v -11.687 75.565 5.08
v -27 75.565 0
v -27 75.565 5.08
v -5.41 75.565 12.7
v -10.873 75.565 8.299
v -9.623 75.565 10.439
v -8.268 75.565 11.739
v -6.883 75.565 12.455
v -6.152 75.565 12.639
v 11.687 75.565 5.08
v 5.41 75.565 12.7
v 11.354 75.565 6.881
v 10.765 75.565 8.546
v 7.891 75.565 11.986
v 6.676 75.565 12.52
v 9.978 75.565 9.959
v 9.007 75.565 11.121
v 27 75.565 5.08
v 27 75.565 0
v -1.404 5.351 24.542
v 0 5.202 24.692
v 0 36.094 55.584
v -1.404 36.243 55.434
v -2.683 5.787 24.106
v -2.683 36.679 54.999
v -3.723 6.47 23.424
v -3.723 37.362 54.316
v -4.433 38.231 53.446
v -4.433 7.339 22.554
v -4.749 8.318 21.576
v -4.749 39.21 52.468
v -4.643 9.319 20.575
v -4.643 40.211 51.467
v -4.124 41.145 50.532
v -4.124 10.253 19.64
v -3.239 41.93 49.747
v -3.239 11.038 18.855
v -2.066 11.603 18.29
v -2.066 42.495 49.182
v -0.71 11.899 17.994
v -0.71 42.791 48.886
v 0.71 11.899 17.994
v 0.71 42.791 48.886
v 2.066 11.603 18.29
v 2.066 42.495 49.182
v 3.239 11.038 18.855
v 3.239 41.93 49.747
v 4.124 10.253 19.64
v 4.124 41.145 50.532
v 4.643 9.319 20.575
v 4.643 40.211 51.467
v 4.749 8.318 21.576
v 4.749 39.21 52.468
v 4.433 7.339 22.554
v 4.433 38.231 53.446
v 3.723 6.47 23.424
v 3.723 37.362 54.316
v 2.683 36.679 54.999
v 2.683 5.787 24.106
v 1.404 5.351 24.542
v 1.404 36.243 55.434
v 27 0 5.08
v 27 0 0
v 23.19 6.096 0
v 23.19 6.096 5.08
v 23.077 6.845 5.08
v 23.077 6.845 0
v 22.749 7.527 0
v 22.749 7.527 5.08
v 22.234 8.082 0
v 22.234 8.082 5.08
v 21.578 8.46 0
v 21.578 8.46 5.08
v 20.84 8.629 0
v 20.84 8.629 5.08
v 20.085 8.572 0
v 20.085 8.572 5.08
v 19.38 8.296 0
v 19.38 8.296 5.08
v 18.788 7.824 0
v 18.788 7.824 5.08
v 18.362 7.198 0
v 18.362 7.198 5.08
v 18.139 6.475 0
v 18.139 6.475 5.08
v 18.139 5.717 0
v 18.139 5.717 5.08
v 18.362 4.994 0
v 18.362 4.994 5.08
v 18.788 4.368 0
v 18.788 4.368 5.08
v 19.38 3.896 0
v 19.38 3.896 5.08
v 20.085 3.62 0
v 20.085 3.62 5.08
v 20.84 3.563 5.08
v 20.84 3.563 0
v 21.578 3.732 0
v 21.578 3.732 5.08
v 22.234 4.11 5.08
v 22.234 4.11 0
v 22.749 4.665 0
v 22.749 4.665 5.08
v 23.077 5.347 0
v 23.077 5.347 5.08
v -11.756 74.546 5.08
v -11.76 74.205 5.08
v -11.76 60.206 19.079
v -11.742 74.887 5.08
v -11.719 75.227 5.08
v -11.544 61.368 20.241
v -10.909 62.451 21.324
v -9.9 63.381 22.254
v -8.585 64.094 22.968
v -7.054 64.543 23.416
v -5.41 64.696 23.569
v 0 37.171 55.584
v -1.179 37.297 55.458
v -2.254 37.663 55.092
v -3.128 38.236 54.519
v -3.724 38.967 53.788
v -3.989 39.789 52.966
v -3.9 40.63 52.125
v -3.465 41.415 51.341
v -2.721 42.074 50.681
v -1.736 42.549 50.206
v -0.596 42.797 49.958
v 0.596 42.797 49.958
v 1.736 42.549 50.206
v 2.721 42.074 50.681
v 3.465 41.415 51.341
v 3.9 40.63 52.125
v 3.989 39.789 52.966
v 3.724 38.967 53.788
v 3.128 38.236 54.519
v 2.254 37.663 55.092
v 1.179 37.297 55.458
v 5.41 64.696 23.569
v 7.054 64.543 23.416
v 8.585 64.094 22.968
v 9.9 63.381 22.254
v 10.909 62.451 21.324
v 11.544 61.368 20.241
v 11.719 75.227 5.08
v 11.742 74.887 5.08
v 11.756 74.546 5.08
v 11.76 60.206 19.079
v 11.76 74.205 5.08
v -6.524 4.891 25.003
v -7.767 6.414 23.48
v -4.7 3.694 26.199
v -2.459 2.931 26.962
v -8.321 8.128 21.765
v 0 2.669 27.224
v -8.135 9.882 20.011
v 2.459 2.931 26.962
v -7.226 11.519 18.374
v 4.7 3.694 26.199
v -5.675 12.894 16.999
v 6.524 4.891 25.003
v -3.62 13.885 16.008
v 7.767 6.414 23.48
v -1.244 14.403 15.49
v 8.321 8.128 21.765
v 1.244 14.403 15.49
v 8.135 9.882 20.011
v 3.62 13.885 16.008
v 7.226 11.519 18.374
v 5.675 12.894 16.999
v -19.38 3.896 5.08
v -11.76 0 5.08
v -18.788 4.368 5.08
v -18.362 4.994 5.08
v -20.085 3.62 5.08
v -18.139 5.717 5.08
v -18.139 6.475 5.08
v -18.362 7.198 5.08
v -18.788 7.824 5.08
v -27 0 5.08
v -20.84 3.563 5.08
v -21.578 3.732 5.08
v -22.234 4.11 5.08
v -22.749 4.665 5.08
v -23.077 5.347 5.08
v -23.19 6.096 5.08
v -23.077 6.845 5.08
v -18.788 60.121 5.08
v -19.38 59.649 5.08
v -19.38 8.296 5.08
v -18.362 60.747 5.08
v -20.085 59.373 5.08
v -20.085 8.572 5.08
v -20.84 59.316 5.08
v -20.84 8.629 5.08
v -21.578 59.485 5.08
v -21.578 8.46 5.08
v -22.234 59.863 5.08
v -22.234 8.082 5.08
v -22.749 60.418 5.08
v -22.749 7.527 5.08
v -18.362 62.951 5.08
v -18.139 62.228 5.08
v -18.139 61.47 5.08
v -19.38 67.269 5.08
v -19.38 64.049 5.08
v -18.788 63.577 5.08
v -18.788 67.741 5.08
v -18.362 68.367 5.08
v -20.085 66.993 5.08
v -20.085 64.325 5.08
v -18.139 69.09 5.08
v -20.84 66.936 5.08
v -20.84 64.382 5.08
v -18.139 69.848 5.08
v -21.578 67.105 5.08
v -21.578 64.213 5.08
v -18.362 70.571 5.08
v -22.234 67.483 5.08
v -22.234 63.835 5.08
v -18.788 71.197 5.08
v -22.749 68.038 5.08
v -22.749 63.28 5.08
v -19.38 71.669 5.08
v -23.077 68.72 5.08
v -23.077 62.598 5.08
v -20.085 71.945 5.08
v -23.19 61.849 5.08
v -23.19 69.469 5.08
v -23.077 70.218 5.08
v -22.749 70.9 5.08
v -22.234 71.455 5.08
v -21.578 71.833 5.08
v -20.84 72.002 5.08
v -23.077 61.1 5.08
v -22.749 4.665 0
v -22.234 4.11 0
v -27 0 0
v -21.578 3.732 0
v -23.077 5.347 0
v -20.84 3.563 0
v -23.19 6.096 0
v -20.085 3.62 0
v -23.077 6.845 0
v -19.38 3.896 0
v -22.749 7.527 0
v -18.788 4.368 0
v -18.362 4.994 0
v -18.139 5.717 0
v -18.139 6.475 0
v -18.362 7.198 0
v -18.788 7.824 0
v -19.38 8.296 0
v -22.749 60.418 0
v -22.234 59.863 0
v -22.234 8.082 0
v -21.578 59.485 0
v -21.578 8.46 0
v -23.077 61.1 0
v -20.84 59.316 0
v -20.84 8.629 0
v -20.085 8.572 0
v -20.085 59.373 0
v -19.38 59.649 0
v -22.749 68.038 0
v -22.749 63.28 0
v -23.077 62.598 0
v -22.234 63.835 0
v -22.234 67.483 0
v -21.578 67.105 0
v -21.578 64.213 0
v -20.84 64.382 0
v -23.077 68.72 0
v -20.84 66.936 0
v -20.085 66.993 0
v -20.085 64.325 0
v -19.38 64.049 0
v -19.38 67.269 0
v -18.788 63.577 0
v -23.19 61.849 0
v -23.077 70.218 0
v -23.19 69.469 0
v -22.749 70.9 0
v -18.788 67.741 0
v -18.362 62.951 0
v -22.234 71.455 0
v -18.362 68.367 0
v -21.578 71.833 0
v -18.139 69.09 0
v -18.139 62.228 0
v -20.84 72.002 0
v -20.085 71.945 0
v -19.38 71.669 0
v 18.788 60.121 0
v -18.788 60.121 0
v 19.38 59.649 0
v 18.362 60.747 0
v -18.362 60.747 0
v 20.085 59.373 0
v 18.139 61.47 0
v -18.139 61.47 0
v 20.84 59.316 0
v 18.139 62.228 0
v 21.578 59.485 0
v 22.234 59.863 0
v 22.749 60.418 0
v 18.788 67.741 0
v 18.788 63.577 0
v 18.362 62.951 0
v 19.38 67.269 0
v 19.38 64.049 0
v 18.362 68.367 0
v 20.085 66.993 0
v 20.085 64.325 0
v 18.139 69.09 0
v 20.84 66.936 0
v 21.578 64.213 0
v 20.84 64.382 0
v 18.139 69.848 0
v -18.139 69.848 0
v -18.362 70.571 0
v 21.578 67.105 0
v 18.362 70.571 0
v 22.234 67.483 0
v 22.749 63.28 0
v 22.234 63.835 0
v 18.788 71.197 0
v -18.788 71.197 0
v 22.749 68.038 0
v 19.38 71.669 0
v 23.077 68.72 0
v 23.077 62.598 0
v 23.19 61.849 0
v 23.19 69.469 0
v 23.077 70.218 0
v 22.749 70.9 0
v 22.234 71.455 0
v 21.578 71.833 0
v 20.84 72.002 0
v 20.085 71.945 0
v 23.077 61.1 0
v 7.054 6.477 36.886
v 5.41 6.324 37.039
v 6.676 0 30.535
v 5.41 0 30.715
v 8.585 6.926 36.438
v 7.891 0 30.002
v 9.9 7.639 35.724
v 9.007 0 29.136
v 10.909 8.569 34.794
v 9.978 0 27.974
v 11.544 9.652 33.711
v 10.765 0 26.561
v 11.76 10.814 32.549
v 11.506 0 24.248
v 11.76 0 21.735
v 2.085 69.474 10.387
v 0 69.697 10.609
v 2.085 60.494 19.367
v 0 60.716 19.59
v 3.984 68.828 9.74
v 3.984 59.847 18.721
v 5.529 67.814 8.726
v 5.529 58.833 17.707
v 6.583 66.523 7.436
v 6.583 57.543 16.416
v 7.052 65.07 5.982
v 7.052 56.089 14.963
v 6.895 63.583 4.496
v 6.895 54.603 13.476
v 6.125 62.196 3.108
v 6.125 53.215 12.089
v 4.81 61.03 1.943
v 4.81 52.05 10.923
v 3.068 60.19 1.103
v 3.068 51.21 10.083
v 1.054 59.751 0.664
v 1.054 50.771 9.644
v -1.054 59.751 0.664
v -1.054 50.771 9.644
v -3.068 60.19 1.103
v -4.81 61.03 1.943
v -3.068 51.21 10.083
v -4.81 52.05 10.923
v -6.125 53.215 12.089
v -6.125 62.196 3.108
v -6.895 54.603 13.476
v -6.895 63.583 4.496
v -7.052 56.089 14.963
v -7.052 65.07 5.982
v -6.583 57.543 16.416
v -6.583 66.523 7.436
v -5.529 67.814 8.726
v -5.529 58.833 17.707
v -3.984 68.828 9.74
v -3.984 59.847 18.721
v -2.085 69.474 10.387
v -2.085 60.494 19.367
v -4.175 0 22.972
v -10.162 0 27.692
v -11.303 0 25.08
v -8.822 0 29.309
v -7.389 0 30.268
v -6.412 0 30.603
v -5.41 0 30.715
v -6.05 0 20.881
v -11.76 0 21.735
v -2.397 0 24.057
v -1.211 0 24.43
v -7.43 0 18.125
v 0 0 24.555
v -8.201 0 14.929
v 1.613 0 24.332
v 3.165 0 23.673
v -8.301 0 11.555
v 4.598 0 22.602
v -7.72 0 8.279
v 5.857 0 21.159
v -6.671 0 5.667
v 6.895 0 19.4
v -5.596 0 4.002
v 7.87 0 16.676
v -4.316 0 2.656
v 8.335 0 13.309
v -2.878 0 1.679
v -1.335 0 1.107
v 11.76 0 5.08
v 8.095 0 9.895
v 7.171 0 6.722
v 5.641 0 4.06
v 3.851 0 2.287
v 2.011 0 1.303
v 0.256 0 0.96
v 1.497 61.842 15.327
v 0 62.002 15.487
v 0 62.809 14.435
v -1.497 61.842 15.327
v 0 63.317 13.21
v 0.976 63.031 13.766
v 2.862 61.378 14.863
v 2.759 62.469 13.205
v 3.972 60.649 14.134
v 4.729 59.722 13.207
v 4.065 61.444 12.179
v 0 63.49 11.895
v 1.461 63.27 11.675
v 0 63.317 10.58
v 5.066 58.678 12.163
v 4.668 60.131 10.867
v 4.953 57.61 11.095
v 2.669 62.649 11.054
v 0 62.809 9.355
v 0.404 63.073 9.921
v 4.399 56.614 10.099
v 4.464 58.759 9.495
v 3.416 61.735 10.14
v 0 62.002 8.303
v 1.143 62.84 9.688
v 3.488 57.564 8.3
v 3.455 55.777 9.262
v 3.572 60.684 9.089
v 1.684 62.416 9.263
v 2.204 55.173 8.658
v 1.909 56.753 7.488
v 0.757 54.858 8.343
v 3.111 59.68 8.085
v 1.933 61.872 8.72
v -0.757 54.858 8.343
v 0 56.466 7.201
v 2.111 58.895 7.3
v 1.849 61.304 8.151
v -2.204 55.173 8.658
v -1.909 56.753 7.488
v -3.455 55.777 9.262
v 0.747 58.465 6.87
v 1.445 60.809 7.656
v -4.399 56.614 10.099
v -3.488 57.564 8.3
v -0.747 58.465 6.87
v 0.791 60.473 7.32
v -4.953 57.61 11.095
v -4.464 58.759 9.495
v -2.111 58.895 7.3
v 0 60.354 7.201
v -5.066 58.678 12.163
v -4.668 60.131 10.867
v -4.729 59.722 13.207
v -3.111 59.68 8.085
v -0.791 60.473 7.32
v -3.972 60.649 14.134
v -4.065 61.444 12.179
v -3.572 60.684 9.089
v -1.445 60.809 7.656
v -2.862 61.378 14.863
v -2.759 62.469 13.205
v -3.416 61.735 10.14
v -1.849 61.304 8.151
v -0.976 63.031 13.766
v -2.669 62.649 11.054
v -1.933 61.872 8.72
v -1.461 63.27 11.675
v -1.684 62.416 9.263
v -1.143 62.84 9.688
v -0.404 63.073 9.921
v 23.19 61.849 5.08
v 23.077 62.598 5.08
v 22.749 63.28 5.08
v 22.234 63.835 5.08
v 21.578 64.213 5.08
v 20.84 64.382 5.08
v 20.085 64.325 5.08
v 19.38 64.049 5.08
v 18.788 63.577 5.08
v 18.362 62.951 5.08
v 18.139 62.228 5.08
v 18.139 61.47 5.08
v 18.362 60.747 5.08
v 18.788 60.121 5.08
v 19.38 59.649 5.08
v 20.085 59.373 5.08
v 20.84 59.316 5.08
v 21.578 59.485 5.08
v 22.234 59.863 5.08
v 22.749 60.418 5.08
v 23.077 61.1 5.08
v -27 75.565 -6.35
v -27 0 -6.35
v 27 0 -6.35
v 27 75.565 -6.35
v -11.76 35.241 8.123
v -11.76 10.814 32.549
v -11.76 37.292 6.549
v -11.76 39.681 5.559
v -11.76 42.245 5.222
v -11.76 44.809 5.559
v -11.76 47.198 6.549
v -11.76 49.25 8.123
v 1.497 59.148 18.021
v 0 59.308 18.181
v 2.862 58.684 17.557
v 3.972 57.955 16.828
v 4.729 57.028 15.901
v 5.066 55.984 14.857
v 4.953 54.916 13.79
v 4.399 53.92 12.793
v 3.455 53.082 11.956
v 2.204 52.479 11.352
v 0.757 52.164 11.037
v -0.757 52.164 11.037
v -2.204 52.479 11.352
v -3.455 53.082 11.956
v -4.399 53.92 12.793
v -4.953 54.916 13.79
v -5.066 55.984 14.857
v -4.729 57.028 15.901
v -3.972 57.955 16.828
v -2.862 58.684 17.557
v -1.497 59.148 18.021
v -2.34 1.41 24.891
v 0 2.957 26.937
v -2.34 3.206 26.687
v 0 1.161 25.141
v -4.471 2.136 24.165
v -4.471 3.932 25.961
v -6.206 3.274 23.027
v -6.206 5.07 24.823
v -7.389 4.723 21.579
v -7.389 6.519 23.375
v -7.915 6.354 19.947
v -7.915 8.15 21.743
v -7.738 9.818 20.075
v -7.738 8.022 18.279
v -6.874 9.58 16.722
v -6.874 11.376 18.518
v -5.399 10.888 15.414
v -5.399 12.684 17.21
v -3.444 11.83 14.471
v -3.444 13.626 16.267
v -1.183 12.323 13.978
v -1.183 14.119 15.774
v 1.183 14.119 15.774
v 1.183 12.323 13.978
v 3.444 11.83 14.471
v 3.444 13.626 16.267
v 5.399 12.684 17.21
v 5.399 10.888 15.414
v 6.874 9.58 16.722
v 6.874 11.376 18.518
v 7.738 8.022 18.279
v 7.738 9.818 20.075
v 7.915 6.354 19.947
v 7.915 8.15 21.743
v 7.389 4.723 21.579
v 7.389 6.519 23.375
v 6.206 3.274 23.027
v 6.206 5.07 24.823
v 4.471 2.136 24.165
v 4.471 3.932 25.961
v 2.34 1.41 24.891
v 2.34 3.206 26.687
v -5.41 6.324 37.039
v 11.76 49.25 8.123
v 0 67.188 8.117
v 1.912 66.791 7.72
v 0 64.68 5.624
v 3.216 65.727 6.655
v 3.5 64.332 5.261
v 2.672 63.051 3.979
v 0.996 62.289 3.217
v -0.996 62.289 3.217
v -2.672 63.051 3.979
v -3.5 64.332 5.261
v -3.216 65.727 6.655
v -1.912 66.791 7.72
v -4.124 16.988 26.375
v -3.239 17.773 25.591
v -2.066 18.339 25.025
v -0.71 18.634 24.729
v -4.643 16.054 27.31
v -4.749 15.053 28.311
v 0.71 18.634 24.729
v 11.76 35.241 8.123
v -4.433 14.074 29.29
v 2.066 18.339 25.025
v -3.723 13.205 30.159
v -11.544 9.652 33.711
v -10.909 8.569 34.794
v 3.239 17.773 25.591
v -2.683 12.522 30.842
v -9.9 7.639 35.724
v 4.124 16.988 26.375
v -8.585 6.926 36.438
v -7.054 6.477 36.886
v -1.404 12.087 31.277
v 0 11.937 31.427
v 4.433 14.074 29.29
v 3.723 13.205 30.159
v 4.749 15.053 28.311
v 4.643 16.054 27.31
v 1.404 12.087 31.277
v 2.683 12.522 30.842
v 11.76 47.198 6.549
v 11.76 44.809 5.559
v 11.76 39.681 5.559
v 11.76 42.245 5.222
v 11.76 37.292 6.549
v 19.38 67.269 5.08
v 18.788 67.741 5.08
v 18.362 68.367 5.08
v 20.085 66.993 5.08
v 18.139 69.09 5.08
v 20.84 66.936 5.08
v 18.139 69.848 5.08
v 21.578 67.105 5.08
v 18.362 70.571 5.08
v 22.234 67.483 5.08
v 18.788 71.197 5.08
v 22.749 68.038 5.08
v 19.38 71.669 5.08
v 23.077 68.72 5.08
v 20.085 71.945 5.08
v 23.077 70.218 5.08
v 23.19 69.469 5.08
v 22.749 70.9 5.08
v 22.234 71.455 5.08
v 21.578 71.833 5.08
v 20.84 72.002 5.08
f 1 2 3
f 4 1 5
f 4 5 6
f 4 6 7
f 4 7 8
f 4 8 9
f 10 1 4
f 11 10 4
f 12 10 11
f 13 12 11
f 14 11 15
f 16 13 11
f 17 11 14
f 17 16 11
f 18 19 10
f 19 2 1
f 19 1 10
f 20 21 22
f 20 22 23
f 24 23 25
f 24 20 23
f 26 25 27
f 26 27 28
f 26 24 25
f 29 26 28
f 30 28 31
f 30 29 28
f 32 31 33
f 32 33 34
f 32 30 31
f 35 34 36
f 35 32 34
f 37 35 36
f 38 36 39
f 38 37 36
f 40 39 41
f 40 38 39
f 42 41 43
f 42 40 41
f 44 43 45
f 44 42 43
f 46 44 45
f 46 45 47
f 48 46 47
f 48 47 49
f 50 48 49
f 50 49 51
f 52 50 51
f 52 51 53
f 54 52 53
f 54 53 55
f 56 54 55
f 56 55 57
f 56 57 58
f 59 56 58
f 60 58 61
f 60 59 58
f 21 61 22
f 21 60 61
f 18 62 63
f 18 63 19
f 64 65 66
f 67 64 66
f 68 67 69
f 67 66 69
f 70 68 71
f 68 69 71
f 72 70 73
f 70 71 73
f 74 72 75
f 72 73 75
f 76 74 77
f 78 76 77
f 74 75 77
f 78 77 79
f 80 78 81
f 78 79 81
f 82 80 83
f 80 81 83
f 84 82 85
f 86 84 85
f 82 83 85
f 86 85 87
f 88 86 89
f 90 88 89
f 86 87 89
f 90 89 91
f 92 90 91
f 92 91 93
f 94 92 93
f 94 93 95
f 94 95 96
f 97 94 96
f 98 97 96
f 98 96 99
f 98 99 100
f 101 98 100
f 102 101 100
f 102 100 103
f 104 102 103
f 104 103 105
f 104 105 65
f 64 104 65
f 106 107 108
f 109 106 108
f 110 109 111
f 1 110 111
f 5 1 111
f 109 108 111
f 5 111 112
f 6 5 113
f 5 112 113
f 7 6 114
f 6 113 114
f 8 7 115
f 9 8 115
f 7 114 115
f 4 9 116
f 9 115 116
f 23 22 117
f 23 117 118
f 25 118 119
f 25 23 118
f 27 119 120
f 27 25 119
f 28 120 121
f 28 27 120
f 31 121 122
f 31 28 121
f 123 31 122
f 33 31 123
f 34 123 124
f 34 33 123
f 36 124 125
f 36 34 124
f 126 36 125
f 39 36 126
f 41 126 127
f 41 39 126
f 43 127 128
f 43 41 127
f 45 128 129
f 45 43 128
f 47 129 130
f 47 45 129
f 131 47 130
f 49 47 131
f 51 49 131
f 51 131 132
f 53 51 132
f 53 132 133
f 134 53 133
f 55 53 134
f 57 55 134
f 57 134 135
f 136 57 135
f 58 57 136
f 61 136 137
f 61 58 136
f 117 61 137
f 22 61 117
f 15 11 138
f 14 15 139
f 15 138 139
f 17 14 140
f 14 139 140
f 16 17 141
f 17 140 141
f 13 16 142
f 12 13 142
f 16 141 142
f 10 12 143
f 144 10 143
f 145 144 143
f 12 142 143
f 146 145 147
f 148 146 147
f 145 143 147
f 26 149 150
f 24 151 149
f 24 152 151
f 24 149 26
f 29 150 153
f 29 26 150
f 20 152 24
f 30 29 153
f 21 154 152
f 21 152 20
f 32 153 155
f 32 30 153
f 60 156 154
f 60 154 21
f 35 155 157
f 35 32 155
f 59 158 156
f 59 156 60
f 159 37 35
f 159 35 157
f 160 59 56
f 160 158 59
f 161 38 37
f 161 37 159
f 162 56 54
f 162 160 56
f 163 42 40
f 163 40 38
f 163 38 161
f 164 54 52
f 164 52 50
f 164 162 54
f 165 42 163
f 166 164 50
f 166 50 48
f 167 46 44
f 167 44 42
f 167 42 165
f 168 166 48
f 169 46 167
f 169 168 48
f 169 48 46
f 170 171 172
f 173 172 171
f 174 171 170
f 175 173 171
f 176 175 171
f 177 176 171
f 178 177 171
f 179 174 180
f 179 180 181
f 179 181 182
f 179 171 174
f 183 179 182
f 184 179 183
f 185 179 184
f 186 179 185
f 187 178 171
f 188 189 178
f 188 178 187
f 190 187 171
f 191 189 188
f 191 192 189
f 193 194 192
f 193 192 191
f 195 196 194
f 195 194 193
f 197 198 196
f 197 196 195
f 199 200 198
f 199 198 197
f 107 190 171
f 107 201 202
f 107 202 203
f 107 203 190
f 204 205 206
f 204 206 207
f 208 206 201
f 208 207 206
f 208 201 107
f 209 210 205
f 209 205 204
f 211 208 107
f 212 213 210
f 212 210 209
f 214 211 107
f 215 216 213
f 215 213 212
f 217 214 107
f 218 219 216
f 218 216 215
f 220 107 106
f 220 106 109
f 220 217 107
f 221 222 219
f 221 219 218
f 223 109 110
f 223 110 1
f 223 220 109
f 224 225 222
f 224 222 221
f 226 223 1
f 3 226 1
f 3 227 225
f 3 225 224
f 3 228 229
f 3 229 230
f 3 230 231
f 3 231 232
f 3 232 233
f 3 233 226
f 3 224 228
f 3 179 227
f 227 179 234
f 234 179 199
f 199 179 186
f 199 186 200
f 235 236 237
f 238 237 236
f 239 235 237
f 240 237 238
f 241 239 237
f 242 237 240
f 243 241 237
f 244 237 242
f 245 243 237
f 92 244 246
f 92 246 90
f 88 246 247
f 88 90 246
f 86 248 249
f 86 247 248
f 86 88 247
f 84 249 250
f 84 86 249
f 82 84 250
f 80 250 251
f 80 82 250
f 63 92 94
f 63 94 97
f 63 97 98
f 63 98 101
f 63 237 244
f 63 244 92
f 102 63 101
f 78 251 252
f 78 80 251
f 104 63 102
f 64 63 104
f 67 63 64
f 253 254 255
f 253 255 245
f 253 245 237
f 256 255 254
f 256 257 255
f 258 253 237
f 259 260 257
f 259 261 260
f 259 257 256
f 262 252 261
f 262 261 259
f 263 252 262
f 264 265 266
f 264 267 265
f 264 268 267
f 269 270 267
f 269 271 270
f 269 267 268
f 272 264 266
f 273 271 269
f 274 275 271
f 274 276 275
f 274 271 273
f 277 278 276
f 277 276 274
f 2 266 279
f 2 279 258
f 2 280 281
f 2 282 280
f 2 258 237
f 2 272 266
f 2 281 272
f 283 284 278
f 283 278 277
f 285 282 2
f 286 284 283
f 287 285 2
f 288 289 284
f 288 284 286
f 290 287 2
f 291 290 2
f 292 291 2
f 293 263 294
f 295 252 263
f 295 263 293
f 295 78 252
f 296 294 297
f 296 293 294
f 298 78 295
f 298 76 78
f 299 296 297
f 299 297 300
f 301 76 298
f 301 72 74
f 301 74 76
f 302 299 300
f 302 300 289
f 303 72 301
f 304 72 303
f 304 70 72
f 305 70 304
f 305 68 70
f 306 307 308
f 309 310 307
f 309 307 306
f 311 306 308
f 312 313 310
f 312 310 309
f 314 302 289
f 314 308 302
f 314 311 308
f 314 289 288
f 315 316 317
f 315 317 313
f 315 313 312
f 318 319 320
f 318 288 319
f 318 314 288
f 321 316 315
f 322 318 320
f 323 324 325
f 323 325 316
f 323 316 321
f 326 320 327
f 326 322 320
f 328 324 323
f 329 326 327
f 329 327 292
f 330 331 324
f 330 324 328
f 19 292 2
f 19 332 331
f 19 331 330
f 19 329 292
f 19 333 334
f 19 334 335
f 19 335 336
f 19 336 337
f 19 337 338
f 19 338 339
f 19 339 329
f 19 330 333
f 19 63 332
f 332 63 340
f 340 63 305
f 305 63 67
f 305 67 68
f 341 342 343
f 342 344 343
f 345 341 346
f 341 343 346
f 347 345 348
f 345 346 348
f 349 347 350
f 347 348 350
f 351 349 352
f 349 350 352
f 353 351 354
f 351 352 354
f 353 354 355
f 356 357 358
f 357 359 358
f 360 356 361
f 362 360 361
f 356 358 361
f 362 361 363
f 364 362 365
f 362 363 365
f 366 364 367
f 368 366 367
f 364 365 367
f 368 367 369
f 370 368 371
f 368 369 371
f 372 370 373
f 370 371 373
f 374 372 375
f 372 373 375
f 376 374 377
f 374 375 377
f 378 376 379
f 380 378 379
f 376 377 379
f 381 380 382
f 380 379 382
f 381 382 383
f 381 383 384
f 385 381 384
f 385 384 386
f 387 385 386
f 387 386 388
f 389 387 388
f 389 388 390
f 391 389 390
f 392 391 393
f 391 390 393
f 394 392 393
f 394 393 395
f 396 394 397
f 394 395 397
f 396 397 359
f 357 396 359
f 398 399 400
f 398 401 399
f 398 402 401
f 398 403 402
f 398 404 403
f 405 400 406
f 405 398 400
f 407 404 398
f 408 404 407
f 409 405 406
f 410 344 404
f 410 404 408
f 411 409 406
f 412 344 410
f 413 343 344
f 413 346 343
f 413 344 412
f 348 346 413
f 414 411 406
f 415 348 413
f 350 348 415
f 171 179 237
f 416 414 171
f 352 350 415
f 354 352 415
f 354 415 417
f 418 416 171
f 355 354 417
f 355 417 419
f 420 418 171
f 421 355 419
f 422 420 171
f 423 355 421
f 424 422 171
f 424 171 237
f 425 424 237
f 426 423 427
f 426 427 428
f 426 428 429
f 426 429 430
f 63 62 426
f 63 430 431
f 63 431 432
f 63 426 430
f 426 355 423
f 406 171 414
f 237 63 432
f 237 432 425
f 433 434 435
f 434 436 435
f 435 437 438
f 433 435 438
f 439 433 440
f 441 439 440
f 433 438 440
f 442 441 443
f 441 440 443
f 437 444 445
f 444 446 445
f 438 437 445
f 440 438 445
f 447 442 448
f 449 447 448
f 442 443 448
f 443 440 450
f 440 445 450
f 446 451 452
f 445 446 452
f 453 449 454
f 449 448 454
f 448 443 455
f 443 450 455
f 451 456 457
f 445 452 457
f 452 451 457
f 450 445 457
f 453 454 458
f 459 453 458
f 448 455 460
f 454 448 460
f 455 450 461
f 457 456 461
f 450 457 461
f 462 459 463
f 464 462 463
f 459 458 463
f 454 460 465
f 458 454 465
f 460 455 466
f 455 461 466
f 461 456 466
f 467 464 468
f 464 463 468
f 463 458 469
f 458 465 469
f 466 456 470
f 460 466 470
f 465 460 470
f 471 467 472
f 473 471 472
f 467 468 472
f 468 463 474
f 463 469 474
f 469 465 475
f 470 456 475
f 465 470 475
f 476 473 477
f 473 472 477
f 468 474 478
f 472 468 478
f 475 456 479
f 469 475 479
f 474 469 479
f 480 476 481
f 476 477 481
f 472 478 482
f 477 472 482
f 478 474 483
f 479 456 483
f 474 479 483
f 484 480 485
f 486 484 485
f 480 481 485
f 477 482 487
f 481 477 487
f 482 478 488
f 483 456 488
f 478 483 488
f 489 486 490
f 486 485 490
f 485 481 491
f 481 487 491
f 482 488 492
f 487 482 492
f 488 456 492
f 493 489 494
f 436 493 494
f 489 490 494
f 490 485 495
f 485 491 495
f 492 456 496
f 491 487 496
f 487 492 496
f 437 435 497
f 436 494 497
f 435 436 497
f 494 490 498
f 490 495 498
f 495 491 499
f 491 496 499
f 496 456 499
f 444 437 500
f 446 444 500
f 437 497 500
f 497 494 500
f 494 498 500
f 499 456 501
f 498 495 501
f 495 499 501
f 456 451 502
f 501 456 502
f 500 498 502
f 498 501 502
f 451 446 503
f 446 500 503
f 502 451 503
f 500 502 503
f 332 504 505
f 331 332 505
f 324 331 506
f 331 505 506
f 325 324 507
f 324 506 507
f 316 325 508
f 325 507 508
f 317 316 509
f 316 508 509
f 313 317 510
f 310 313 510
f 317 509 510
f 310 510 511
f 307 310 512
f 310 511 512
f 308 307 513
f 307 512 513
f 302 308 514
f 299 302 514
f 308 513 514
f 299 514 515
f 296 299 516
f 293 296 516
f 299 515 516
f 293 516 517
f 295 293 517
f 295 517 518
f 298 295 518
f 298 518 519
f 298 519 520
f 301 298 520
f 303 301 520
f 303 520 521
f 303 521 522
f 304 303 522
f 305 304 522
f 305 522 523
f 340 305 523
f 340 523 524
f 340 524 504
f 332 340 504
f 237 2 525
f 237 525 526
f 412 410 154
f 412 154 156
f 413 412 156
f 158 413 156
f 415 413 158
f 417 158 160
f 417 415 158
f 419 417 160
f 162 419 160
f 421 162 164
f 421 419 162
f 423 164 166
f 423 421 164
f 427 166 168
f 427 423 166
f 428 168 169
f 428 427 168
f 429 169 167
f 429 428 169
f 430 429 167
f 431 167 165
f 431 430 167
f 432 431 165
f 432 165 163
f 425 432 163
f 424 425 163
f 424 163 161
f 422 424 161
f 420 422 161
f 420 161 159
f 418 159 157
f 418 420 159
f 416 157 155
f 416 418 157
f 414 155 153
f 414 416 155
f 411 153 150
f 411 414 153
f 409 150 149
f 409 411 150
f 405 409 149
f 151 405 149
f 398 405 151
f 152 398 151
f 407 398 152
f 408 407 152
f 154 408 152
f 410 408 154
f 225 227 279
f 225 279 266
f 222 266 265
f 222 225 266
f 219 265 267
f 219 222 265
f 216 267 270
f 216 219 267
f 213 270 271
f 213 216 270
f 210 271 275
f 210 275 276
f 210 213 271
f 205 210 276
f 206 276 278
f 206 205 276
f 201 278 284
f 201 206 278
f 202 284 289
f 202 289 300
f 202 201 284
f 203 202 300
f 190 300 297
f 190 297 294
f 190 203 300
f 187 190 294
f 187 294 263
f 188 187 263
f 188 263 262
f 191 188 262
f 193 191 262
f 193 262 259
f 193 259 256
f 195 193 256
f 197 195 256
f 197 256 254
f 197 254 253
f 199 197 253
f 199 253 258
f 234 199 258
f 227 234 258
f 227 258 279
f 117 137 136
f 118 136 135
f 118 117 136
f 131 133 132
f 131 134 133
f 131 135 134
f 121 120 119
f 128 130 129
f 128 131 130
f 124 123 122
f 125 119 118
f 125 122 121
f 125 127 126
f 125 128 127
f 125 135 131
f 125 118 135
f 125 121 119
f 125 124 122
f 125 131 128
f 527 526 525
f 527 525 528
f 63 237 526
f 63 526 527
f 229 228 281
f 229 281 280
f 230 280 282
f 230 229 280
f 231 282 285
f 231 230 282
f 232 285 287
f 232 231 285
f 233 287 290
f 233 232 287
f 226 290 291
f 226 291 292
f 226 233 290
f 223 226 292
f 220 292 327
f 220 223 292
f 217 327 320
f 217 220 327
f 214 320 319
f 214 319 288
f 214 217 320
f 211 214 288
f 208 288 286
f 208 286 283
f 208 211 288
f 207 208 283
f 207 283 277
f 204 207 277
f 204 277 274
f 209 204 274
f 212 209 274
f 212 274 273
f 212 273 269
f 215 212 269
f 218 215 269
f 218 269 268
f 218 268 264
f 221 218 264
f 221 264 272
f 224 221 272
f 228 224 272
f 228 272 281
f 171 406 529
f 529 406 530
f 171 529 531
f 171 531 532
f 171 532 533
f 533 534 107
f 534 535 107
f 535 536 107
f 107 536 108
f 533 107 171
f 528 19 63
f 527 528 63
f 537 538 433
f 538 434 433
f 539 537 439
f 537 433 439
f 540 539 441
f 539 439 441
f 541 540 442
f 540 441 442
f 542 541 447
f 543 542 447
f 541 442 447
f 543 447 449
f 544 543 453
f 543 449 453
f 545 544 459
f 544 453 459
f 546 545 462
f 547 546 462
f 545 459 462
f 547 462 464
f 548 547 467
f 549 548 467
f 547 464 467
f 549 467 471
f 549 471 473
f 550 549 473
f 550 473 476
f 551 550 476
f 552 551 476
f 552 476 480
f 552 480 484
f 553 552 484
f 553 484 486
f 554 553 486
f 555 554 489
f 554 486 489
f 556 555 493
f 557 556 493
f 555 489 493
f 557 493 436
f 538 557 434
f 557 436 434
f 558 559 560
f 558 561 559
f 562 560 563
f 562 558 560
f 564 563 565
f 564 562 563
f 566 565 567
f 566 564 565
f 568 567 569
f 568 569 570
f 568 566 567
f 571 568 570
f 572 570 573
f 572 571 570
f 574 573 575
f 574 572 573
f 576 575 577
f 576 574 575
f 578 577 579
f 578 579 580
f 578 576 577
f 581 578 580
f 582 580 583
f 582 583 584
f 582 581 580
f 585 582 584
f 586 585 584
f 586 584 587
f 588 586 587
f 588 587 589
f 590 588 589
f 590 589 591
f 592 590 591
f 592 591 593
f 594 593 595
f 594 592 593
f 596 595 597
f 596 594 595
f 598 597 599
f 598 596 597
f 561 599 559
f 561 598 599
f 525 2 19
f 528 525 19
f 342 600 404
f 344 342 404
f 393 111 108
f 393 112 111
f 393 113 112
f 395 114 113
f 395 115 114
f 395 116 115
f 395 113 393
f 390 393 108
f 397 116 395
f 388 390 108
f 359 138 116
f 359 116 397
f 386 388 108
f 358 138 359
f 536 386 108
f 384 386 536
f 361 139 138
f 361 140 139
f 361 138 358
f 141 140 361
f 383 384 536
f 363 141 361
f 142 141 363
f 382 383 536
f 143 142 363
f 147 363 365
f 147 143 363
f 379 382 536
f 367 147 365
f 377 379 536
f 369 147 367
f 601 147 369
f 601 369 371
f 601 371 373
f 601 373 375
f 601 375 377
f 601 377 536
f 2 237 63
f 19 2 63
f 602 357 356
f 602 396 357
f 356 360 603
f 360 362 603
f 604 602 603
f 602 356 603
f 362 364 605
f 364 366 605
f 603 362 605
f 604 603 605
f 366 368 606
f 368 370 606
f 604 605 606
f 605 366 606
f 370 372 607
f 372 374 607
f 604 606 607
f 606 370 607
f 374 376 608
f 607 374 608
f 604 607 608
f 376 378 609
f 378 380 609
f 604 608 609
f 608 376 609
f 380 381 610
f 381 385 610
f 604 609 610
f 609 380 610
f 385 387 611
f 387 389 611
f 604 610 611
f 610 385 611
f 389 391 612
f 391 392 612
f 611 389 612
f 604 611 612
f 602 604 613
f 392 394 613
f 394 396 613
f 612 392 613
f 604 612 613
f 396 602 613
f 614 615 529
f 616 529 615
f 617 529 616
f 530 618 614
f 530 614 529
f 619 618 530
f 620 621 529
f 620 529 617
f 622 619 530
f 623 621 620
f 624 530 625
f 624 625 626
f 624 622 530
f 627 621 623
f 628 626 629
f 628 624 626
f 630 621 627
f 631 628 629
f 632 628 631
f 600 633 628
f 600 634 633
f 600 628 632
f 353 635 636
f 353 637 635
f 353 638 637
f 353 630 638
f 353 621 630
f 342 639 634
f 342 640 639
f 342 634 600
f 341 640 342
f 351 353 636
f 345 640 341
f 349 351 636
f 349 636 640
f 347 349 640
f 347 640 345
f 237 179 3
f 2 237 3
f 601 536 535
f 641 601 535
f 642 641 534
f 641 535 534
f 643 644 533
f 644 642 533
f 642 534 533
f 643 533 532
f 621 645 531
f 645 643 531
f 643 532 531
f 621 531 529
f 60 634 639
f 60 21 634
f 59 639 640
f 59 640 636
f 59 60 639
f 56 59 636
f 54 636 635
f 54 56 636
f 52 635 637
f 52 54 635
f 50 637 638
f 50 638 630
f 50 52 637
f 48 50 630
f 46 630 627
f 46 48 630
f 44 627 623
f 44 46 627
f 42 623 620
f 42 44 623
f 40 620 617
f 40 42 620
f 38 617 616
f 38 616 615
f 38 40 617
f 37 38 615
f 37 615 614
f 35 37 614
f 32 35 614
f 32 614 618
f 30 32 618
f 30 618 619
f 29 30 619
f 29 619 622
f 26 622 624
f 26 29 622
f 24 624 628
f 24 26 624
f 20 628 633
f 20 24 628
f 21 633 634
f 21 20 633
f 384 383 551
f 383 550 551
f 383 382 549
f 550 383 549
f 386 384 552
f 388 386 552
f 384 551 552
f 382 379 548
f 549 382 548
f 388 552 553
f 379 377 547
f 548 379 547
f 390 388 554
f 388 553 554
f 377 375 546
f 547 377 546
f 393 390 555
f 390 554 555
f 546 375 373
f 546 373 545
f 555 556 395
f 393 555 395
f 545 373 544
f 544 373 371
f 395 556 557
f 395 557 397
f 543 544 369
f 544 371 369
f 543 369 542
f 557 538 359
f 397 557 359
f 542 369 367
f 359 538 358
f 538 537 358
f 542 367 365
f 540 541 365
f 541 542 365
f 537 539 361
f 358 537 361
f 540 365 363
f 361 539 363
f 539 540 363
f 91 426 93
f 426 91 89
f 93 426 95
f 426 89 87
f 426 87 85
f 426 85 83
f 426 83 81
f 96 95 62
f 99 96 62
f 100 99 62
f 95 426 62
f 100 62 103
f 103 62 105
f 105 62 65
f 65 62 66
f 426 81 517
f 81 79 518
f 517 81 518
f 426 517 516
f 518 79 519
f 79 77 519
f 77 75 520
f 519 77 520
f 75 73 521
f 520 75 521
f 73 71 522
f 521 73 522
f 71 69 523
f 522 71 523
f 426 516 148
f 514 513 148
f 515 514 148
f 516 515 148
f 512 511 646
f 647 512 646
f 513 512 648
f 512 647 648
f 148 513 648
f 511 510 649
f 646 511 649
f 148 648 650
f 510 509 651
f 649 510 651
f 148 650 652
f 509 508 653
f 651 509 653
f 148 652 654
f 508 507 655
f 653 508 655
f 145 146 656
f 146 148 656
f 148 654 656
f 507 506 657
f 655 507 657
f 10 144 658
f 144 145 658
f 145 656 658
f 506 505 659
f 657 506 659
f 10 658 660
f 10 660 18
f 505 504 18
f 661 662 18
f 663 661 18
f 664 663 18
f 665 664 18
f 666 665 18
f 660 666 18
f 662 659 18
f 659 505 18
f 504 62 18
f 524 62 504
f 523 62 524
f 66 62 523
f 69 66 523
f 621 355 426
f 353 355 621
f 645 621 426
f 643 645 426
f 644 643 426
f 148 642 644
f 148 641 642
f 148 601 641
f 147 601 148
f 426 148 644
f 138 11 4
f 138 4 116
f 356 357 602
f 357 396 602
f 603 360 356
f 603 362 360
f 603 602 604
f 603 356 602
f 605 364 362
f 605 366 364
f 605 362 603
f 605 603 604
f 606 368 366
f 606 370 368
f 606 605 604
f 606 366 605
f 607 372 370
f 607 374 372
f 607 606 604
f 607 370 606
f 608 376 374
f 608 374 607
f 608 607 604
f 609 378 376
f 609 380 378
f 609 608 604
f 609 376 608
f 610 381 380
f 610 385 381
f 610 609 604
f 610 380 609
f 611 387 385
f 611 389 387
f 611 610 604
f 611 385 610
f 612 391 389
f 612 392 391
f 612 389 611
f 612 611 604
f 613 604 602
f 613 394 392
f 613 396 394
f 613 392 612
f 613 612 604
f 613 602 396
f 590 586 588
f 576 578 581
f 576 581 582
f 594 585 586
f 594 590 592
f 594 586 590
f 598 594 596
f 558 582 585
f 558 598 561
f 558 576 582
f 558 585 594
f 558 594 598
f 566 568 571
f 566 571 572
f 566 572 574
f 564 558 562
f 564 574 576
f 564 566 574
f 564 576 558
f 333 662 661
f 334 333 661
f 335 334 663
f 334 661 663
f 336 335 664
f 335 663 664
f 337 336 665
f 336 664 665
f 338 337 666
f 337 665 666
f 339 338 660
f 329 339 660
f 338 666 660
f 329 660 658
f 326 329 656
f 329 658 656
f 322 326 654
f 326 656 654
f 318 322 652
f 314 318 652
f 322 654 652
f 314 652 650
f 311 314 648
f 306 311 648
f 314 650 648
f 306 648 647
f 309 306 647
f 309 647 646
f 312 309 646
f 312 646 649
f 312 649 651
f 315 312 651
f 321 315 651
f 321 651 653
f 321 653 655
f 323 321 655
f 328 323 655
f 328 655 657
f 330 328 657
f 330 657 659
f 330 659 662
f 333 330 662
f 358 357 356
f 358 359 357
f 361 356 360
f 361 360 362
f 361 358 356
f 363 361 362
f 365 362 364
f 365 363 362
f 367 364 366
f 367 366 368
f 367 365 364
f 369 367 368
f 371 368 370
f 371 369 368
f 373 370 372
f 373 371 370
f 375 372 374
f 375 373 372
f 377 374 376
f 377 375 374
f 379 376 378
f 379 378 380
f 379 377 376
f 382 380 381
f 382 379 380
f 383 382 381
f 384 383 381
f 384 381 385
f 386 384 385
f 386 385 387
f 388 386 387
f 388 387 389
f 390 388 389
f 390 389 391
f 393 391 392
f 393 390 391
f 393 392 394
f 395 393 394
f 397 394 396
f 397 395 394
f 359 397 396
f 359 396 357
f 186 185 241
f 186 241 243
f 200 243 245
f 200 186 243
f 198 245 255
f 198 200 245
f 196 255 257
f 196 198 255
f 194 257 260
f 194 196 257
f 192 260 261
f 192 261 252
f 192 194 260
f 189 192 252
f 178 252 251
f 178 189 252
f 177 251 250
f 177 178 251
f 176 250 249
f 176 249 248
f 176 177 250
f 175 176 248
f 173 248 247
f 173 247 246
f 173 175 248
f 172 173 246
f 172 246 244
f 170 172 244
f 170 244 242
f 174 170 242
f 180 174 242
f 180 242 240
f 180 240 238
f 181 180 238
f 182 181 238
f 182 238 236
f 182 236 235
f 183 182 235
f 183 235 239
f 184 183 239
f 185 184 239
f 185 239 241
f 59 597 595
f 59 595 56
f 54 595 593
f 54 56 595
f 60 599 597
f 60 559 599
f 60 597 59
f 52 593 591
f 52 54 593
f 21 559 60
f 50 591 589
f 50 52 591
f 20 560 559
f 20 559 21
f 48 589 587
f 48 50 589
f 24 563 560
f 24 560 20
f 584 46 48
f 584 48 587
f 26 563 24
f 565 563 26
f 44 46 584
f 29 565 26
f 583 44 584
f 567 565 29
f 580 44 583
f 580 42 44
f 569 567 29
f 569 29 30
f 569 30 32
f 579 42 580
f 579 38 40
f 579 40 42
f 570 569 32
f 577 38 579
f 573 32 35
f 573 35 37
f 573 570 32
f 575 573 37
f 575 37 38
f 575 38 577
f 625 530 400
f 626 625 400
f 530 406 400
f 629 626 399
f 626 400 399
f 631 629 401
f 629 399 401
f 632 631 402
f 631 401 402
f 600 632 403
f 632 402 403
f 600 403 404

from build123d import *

# Parameters (mm, degrees)
F1_DEPTH  = 27.0002
F2_R      = 9.906
F3_W      = 75.565
F3_H      = 31.9594877579
F4_DEPTH  = 15.24
F5_R      = 2.54
F6_DEPTH  = 5.081
F8_R      = 6.35
F13_SIZE  = 0.762
F18_W     = 54.0004
F18_H     = 75.565
F19_DEPTH = 6.35


with BuildPart() as f1:
    # F0 (on Right) → F1 (new body)
    with BuildSketch(Plane.YZ):
        Polygon((0, 30.7152561211), (0, 0), (75.565, 0), (75.565, 12.7), (64.6958964237, 23.5691035763), (42.2452561211, 1.1184632736), (6.3242316368, 37.0394877579), align=None)
    extrude(amount=F1_DEPTH)

    # F2
    f2_edges = [f1.edges().sort_by_distance(p)[0] for p in [
        (13.5001, 42.245256, 1.118463),
    ]]
    fillet(f2_edges, radius=F2_R)

    # F3 (on face) → F4 (cut)
    with BuildSketch(Plane.YZ.offset(27.0002)):
        with Locations((37.7825, 21.0597438789)):
            Rectangle(F3_W, F3_H)
    extrude(amount=-F4_DEPTH, mode=Mode.SUBTRACT)

    # F5 (on face) → F6 (cut, through all)
    with BuildSketch(Plane.XY.offset(5.08)):
        with Locations((20.6502, 69.469)):
            Circle(F5_R)
        with Locations((20.6502, 61.849)):
            Circle(F5_R)
        with Locations((20.6502, 6.096)):
            Circle(F5_R)
    extrude(amount=-F6_DEPTH, mode=Mode.SUBTRACT)

    # F7: F1 across face


with BuildPart() as f1_1:
    add(f1.part)
    add(f1.part.mirror(Plane(origin=(0, 31.4337361572, 11.6287579026), x_dir=(0, 1, 0), z_dir=(-1, 0, 0))))

    # F8
    f8_edges = [f1_1.edges().sort_by_distance(p)[0] for p in [
        (11.7602, 3.162116, 33.877372),
        (-11.7602, 3.162116, 33.877372),
        (11.7602, 70.130448, 18.134552),
        (-11.7602, 70.130448, 18.134552),
    ]]
    fillet(f8_edges, radius=F8_R)

    # F9 (on Right) → F10 (revolve, cut)
    with BuildSketch(Plane.YZ):
        Polygon((15.3044877579, 28.0592316368), (11.9368917125, 31.4268276822), (5.2016996217, 24.6916355914), (2.6692673955, 27.2240678175), (-18.6547721505, 5.9000282715), (-12.7547438789, 0), align=None)
    revolve(axis=Axis((0, 22.0396798487, 34.7944237276), (0, 0.7071067812, 0.7071067812)), mode=Mode.SUBTRACT)

    # F14 (on Right) → F15 (revolve, cut)
    with BuildSketch(Plane.YZ):
        Polygon((69.6965536408, 10.6092485512), (60.7162975197, 19.5895046723), (55.7156403027, 14.5888474552), (64.680101436, 5.6243863219), align=None)
    revolve(axis=Axis((0, 46.7274866877, 23.5770010701), (0, 0.7071067812, -0.7071067812)), mode=Mode.SUBTRACT)


with BuildPart() as f12:
    # F11 (on Right) → F12 (revolve)
    with BuildSketch(Plane.YZ):
        Polygon((11.9368917125, 31.4268276822), (5.2016996217, 24.6916355914), (2.9566355914, 26.9366996217), (1.1605843672, 25.1406483974), (6.7732444428, 19.5279883218), (40.0001920908, 52.7549359697), (36.6325960454, 56.1225320151), align=None)
    revolve(axis=Axis((0, 2.5810948587, 15.3358387377), (0, -0.7071067812, -0.7071067812)))

    # F13
    f13_edges = [f12.edges().sort_by_distance(p)[0] for p in [
        (0, 43.367788, 49.38734),
    ]]
    chamfer(f13_edges, length=F13_SIZE)


with BuildPart() as f17:
    # F16 (on Right) → F17 (revolve)
    with BuildSketch(Plane.YZ):
        with BuildLine():
            ThreePointArc((62.0018195874, 15.4868730673), (63.489717139, 11.8947706189), (62.0018195874, 8.3026681704))
            Line((62.0018195874, 8.3026681704), (64.680101436, 5.6243863219))
            Line((64.680101436, 5.6243863219), (69.6965536408, 10.6092485512))
            Line((69.6965536408, 10.6092485512), (60.7162975197, 19.5895046723))
            Line((60.7162975197, 19.5895046723), (59.3077427511, 18.1809499036))
            Line((59.3077427511, 18.1809499036), (62.0018195874, 15.4868730673))
        make_face()
    revolve(axis=Axis((0, 46.7274866877, 23.5770010701), (0, 0.7071067812, -0.7071067812)))


with BuildPart() as f19:
    # F18 (on face) → F19 (new body)
    with BuildSketch(Plane(origin=(0, 0, 0), x_dir=(1, 0, 0), z_dir=(0, 0, -1))):
        with Locations((0, -37.7825)):
            Rectangle(F18_W, F18_H)
    extrude(amount=F19_DEPTH)


solid = Compound([f1_1.part, f12.part, f17.part, f19.part])
